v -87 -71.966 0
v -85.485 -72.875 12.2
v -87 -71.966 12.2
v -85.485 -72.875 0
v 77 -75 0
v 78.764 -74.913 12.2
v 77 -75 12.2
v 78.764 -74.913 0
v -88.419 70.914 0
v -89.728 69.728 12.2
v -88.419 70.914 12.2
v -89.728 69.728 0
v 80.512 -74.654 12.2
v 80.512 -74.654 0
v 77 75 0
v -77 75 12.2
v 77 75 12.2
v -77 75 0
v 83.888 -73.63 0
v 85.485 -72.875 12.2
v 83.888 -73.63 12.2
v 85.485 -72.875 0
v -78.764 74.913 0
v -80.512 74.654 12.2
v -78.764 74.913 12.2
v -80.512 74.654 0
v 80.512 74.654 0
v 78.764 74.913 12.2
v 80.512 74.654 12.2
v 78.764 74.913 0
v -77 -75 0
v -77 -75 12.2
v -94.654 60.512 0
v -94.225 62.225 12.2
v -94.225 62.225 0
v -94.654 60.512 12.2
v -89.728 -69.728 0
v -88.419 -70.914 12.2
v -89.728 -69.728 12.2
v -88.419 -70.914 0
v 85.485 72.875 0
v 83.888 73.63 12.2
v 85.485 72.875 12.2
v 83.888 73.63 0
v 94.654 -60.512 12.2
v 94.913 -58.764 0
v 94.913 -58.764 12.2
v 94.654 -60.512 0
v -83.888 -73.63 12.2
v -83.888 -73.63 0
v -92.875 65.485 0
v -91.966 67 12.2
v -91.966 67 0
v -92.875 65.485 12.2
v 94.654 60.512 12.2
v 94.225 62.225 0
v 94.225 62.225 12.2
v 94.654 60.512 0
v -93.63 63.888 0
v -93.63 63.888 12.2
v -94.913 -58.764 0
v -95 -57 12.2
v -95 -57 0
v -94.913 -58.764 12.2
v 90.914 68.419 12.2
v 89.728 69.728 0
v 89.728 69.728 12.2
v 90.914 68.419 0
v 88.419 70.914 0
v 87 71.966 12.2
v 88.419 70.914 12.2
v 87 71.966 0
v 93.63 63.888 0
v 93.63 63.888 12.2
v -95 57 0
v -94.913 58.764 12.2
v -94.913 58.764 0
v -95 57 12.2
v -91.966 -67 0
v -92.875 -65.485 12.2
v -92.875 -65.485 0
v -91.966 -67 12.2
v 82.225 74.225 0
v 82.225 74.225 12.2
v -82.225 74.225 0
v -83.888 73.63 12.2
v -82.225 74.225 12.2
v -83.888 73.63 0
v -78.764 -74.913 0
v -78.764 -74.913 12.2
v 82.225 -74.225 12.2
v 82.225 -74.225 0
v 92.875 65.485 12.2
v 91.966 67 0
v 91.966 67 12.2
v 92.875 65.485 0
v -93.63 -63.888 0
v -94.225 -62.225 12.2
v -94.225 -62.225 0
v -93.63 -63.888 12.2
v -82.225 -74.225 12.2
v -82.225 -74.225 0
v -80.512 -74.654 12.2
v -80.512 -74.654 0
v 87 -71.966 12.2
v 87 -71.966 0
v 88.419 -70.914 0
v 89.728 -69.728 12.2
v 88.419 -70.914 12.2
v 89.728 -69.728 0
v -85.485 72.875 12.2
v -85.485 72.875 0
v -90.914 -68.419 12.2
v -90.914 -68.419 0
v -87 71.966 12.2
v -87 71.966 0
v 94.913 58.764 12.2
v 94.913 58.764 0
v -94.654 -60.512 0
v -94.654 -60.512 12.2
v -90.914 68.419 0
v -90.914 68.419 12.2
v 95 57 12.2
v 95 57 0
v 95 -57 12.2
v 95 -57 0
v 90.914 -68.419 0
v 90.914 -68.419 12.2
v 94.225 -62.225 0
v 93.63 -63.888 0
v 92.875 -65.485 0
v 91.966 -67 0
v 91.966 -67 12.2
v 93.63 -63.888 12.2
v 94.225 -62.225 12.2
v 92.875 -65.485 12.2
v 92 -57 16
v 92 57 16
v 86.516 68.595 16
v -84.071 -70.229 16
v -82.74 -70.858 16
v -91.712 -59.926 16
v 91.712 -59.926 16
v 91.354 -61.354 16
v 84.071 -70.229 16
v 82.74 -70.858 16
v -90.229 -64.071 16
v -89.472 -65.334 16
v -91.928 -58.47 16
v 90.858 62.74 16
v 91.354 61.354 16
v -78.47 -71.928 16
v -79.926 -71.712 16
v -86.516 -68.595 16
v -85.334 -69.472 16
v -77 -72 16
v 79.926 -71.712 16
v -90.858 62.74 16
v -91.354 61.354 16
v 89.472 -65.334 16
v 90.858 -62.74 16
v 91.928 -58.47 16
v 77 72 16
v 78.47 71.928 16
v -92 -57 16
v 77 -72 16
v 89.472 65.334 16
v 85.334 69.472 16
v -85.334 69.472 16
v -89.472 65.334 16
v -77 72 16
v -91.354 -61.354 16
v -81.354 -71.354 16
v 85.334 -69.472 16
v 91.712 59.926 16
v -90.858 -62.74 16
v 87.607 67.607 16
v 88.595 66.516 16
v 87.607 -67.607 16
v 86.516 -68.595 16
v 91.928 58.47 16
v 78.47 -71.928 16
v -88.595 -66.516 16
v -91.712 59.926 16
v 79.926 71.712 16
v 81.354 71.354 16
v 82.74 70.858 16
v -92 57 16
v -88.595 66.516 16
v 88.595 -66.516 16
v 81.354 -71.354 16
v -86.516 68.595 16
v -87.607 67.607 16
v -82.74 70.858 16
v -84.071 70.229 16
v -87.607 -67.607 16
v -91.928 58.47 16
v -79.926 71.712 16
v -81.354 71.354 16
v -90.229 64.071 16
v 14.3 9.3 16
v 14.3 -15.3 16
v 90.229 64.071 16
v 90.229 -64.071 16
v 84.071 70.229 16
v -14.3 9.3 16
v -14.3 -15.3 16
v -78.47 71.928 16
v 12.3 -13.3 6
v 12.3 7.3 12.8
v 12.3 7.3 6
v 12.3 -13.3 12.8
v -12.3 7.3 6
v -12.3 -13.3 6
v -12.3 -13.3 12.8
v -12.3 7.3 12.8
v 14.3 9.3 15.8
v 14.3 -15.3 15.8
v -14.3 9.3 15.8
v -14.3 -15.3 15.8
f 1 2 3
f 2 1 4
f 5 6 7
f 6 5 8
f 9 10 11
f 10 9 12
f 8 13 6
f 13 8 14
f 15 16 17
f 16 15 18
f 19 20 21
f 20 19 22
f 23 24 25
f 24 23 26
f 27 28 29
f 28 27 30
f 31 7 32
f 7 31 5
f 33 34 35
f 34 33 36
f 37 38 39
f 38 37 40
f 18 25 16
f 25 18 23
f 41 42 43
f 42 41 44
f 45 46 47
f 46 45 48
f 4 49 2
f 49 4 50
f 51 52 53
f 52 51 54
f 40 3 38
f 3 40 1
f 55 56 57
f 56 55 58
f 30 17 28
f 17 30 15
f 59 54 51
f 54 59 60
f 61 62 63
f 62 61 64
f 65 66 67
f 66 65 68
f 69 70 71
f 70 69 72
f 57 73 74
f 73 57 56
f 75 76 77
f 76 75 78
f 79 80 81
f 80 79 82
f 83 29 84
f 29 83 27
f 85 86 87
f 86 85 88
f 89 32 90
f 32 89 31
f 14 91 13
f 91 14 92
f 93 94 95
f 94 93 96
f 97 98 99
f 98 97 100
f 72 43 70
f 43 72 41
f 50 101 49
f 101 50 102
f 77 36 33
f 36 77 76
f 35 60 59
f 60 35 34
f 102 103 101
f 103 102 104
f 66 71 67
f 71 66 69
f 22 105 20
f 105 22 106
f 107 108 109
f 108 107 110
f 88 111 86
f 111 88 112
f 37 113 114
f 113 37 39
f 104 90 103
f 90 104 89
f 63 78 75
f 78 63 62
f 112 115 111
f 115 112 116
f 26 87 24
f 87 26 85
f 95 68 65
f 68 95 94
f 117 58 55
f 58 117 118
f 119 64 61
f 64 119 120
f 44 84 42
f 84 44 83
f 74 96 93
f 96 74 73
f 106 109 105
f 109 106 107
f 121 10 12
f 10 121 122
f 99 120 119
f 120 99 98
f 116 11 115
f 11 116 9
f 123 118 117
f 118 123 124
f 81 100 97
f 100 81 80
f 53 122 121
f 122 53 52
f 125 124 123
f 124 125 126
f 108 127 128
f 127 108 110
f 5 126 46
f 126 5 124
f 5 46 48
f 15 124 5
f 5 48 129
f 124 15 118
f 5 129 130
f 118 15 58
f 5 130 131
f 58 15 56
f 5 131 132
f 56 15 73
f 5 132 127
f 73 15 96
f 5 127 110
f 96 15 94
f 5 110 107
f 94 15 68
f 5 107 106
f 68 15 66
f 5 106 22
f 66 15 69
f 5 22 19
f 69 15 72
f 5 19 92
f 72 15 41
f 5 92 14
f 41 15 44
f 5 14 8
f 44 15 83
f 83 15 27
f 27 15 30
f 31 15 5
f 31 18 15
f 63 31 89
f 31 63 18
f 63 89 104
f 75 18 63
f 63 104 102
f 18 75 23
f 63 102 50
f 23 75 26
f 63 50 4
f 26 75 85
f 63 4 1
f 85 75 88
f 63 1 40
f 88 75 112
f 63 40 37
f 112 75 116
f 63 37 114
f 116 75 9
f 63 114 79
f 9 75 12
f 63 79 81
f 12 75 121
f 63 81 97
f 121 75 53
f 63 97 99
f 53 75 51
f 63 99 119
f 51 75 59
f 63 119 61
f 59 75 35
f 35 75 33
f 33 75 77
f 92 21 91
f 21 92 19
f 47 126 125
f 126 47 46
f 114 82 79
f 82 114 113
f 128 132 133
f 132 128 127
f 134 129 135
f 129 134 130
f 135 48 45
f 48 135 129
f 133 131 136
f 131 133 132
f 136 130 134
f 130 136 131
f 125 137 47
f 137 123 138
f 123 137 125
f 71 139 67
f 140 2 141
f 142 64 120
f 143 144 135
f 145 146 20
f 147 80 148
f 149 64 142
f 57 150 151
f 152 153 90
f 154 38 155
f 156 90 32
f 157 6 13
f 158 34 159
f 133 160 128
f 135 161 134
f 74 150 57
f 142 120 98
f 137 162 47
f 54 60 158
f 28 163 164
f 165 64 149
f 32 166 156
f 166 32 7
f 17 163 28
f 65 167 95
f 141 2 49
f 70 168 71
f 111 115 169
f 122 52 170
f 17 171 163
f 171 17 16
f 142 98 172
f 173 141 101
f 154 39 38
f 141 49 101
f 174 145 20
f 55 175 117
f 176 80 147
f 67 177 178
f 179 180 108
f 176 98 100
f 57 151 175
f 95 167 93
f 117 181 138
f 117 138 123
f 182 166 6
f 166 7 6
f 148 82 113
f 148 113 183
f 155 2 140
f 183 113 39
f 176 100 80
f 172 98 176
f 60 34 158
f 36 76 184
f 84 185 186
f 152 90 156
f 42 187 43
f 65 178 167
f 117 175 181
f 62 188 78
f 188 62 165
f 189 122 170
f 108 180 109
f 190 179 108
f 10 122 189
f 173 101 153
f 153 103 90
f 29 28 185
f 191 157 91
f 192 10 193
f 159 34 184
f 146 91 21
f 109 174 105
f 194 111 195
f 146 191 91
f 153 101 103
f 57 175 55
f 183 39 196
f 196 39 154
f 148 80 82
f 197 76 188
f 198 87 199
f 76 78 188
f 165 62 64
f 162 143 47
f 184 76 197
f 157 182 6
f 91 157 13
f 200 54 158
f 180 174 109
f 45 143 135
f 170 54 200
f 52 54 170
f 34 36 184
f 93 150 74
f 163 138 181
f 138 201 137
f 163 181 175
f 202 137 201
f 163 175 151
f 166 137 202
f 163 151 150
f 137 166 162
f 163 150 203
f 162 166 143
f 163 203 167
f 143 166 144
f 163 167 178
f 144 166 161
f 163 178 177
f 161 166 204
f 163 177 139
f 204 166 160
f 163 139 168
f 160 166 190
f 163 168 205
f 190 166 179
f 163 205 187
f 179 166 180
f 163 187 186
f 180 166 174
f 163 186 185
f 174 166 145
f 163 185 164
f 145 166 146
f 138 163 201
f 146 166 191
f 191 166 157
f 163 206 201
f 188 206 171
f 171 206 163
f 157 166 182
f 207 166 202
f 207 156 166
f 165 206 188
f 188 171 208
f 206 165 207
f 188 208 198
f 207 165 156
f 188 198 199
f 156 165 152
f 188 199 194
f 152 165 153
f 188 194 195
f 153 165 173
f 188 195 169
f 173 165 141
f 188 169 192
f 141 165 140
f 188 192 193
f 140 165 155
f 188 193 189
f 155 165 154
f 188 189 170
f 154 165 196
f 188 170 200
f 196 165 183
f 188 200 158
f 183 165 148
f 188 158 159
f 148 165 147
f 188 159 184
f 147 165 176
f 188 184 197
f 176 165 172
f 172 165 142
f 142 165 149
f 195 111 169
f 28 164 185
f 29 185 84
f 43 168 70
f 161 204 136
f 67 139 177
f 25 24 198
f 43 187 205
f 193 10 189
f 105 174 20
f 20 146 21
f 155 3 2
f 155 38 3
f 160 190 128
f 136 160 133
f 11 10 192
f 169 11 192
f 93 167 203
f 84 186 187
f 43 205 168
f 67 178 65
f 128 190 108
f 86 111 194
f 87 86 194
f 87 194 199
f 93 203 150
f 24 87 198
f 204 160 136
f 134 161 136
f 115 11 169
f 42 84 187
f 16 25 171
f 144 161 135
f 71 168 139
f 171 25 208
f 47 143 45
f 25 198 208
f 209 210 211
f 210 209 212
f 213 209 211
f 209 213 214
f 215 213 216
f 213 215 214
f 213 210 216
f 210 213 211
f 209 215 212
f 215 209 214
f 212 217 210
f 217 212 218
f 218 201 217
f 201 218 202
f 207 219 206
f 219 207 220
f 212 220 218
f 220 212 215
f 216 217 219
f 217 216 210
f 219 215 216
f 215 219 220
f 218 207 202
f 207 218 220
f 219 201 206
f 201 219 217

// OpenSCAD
// Headphone stand in three parts: base, post, hanger.
// No glue, no screws. Rectangular tenon/socket press/clearance fits;
// rectangular sections stop the hanger spinning on the post.
// Print orientations:
//   base   - flat on the bed, socket up
//   post   - lying on its back face, long axis along X
//   hanger - lying on one side face, saddle profile in the X/Y plane
// Assembled top of hanger is 270 mm above the desk.

part = "base"; // [base, post, hanger, assembly]
cadverify_only = "";

$fn = 64;

/* Dimensions (mm) */
base_w = 190;
base_d = 150;
base_t = 16;
base_r = 18;

desk_to_hanger_top = 270;

post_len_print = 241;       // use z 7..248
hanger_len = 124;           // use/print x -62..62
hanger_width = 36;          // use y -18..18
hanger_h_print = 38;        // use z 232..270 at centre

/* Socket / tenon geometry (use coordinates, for reference)
   Post main section:  x -16..16, y -13..13
   Bottom tenon:       x -12..12, y -13..7,  z 7..16   (base socket z 6..16)
   Top tenon:          x -12..12, y -13..3,  z 232..248 (hanger socket from z 232)
   Sockets are tenon size + 0.3 mm clearance per side, with flared mouths.
*/

module instance(name, part_name, unit = 1) {
    echo(cadverify_instance = [name, part_name, unit]);
    if (cadverify_only == "" || cadverify_only == name) children();
}

module box3(x0, x1, y0, y1, z0, z1) {
    translate([x0, y0, z0]) cube([x1 - x0, y1 - y0, z1 - z0]);
}

module rounded_rect(w, d, r) {
    offset(r = r) square([w - 2 * r, d - 2 * r], center = true);
}

/* ---------------- BASE (print = use orientation) ---------------- */
module base_part() {
    difference() {
        union() {
            linear_extrude(12) rounded_rect(base_w, base_d, base_r);
            // 45-ish top edge taper: inset 3 mm over 4 mm height
            hull() {
                translate([0, 0, 12]) linear_extrude(0.2)
                    rounded_rect(base_w, base_d, base_r);
                translate([0, 0, base_t - 0.2]) linear_extrude(0.2)
                    rounded_rect(base_w - 6, base_d - 6, base_r - 3);
            }
        }
        // socket for post bottom tenon: 24.6 x 20.6, centre y=-3, floor z=6
        box3(-12.3, 12.3, -13.3, 7.3, 6, 17);
        // flared socket mouth (entry chamfer), 28.6 x 24.6 at the top face
        hull() {
            translate([0, -3, 15.9]) cube([28.6, 24.6, 0.2], center = true);
            translate([0, -3, 12.9]) cube([24.6, 20.6, 0.2], center = true);
        }
    }
}

/* ---------------- POST (print orientation) ----------------
   Print axes: X = use Z (length, 0 at bottom-tenon tip), Y = use X, Z = use Y + 13.
   Every section reaches Z=0 (the use back face), so it lies flat on the bed. */
module post_part() {
    union() {
        // bottom tenon, tapered lead-in in plan, 24 wide x 20 deep
        linear_extrude(20)
            polygon([[0, -9], [3, -12], [9, -12], [9, 12], [3, 12], [0, 9]]);
        // main shaft 32 x 26
        box3(9, 225, -16, 16, 0, 26);
        // bottom collar 52 wide, sits on the base top
        box3(9, 19, -26, 26, 0, 26);
        // top collar 48 wide, supports the hanger underside
        box3(217, 225, -24, 24, 0, 26);
        // top tenon, tapered lead-in in plan, 24 wide x 16 deep
        linear_extrude(16)
            polygon([[225, -12], [238, -12], [241, -9], [241, 9], [238, 12], [225, 12]]);
    }
}

/* ---------------- HANGER (print orientation) ----------------
   Print axes: X = use X, Y = use Z - 232, Z = use Y side face (0 on the bed).
   The saddle profile (parabolic top and bottom) is extruded across the width. */
module hanger_profile() {
    top = [for (i = [0 : 20]) let (x = -62 + 124 * i / 20)
        [x, hanger_h_print - 14 * pow(x / 62, 2)]];
    bot = [for (i = [20 : -1 : 0]) let (x = -62 + 124 * i / 20)
        [x, 12 * pow(x / 62, 2)]];
    polygon(concat(top, bot));
}

// Prismatic cutter in the Y/Z plane, extruded along X from -75 to 75.
// yz points are [y, z]; the region is the polygon given.
module cutter_yz(yz) {
    pts = [for (p = yz) [-p[1], p[0]]];   // local x = -z, local y = y
    translate([-75, 0, 0]) rotate([0, 90, 0]) linear_extrude(150) polygon(pts);
}

module hanger_part() {
    difference() {
        // saddle body: profile extruded 36 across
        linear_extrude(hanger_width) hanger_profile();
        // rounded (chamfered) longitudinal edges of the saddle top:
        // in print these cut the Y=profile-top / Z=0 and Z=36 corners.
        cutter_yz([[32, 36], [44, 30], [44, 52], [32, 52]]);   // Z=36 side
        cutter_yz([[32, -12], [44, -12], [44, 12], [32, 0]]);  // Z=0 side
        // socket for post top tenon: x -12.3..12.3, print z 14.7..31.3, depth to y=18
        box3(-12.3, 12.3, -2, 18, 14.7, 31.3);
        // flared socket mouth at the underside (print y = 0 face of the pocket)
        hull() {
            box3(-14.3, 14.3, -1.0, -0.8, 12.7, 33.3);
            box3(-12.3, 12.3, 5.0, 5.2, 14.7, 31.3);
        }
    }
}

/* ---------------- VERIFIABLE SPECS ---------------- */
if (part == "base") {
    echo(cadverify_spec = [
        ["bounds", [[-base_w/2, -base_d/2, 0], [base_w/2, base_d/2, base_t]]],
        ["bodies", 1],
        ["through_holes", 0],
        ["support_faces", [["bottom", "-z", 20000]]],
        ["overhangs_allowed", []],
        ["copies", 1],
        ["details", [
            ["base_plate", "material", [[-80, -60, 1], [80, 60, 5]], 0.95],
            ["socket", "void", [[-11, -12, 10], [11, 6, 16.5]], 0.95],
            ["socket_mouth_flare", "void", [[-13, -14, 15], [13, 8, 17]], 0.90],
            ["socket_floor", "thickness", [0, -3, 20], [0, 0, -1], 6],
            ["base_plate_thickness", "thickness", [60, 40, 20], [0, 0, -1], 16],
            ["top_edge_taper", "view", [[70, -20, 11], [96, 20, 17]]]
        ]]
    ]);
} else if (part == "post") {
    echo(cadverify_spec = [
        ["bounds", [[0, -26, 0], [post_len_print, 26, 26]]],
        ["bodies", 1],
        ["through_holes", 0],
        ["support_faces", [["back", "-z", 6000]]],
        ["overhangs_allowed", []],
        ["copies", 1],
        ["details", [
            ["main_shaft", "material", [[50, -14, 2], [100, 14, 24]], 0.95],
            ["bottom_collar", "material", [[10, -25, 2], [18, 25, 24]], 0.90],
            ["top_collar", "material", [[218, -23, 2], [224, 23, 24]], 0.90],
            ["beside_bottom_tenon", "void", [[1, 14, 2], [8, 20, 24]], 0.95],
            ["beside_top_tenon", "void", [[226, 14, 18], [240, 20, 24]], 0.95],
            ["shaft_depth", "thickness", [50, 0, -5], [0, 0, 1], 26],
            ["shaft_width", "thickness", [50, -30, 13], [0, 1, 0], 32],
            ["top_tenon", "view", [[215, -15, 0], [242, 15, 20]]]
        ]]
    ]);
} else if (part == "hanger") {
    echo(cadverify_spec = [
        ["bounds", [[-hanger_len/2, 0, 0], [hanger_len/2, hanger_h_print, hanger_width]]],
        ["bodies", 1],
        ["through_holes", 0],
        ["support_faces", [["side", "-z", 3000]]],
        ["overhangs_allowed", []],
        ["copies", 1],
        ["details", [
            ["saddle_centre", "material", [[-20, 28, 8], [20, 36, 28]], 0.90],
            ["socket", "void", [[-11, 2, 16], [11, 16, 30]], 0.95],
            ["material_above_socket", "thickness", [0, 45, 23], [0, -1, 0], 20],
            ["saddle_width", "thickness", [0, 20, -5], [0, 0, 1], 36],
            ["saddle_top_edge", "view", [[-25, 30, 28], [25, 39, 37]]]
        ]]
    ]);
} else if (part == "assembly") {
    echo(cadverify_spec = [
        ["bounds", [[-base_w/2, -base_d/2, 0], [base_w/2, base_d/2, desk_to_hanger_top]]],
        ["support_faces", [["desk", "-z", 20000]]],
        ["allowed_interferences", []],
        ["assembly_order", [
            [["base"], [0, 0, 0]],
            [["post"], [0, 0, -1]],
            [["hanger"], [0, 0, -1]]
        ]]
    ]);
}

/* ---------------- OUTPUT ---------------- */
if (part == "base") {
    base_part();
} else if (part == "post") {
    post_part();
} else if (part == "hanger") {
    hanger_part();
} else if (part == "assembly") {
    instance("base", "base") base_part();
    // print -> use: Xu=Yp, Yu=Zp-13, Zu=Xp+7
    instance("post", "post")
        multmatrix([[0, 1, 0, 0],
                    [0, 0, 1, -13],
                    [1, 0, 0, 7],
                    [0, 0, 0, 1]]) post_part();
    // print -> use: Xu=Xp, Yu=-Zp+18, Zu=Yp+232
    instance("hanger", "hanger")
        multmatrix([[1, 0, 0, 0],
                    [0, 0, -1, 18],
                    [0, 1, 0, 232],
                    [0, 0, 0, 1]]) hanger_part();
}
